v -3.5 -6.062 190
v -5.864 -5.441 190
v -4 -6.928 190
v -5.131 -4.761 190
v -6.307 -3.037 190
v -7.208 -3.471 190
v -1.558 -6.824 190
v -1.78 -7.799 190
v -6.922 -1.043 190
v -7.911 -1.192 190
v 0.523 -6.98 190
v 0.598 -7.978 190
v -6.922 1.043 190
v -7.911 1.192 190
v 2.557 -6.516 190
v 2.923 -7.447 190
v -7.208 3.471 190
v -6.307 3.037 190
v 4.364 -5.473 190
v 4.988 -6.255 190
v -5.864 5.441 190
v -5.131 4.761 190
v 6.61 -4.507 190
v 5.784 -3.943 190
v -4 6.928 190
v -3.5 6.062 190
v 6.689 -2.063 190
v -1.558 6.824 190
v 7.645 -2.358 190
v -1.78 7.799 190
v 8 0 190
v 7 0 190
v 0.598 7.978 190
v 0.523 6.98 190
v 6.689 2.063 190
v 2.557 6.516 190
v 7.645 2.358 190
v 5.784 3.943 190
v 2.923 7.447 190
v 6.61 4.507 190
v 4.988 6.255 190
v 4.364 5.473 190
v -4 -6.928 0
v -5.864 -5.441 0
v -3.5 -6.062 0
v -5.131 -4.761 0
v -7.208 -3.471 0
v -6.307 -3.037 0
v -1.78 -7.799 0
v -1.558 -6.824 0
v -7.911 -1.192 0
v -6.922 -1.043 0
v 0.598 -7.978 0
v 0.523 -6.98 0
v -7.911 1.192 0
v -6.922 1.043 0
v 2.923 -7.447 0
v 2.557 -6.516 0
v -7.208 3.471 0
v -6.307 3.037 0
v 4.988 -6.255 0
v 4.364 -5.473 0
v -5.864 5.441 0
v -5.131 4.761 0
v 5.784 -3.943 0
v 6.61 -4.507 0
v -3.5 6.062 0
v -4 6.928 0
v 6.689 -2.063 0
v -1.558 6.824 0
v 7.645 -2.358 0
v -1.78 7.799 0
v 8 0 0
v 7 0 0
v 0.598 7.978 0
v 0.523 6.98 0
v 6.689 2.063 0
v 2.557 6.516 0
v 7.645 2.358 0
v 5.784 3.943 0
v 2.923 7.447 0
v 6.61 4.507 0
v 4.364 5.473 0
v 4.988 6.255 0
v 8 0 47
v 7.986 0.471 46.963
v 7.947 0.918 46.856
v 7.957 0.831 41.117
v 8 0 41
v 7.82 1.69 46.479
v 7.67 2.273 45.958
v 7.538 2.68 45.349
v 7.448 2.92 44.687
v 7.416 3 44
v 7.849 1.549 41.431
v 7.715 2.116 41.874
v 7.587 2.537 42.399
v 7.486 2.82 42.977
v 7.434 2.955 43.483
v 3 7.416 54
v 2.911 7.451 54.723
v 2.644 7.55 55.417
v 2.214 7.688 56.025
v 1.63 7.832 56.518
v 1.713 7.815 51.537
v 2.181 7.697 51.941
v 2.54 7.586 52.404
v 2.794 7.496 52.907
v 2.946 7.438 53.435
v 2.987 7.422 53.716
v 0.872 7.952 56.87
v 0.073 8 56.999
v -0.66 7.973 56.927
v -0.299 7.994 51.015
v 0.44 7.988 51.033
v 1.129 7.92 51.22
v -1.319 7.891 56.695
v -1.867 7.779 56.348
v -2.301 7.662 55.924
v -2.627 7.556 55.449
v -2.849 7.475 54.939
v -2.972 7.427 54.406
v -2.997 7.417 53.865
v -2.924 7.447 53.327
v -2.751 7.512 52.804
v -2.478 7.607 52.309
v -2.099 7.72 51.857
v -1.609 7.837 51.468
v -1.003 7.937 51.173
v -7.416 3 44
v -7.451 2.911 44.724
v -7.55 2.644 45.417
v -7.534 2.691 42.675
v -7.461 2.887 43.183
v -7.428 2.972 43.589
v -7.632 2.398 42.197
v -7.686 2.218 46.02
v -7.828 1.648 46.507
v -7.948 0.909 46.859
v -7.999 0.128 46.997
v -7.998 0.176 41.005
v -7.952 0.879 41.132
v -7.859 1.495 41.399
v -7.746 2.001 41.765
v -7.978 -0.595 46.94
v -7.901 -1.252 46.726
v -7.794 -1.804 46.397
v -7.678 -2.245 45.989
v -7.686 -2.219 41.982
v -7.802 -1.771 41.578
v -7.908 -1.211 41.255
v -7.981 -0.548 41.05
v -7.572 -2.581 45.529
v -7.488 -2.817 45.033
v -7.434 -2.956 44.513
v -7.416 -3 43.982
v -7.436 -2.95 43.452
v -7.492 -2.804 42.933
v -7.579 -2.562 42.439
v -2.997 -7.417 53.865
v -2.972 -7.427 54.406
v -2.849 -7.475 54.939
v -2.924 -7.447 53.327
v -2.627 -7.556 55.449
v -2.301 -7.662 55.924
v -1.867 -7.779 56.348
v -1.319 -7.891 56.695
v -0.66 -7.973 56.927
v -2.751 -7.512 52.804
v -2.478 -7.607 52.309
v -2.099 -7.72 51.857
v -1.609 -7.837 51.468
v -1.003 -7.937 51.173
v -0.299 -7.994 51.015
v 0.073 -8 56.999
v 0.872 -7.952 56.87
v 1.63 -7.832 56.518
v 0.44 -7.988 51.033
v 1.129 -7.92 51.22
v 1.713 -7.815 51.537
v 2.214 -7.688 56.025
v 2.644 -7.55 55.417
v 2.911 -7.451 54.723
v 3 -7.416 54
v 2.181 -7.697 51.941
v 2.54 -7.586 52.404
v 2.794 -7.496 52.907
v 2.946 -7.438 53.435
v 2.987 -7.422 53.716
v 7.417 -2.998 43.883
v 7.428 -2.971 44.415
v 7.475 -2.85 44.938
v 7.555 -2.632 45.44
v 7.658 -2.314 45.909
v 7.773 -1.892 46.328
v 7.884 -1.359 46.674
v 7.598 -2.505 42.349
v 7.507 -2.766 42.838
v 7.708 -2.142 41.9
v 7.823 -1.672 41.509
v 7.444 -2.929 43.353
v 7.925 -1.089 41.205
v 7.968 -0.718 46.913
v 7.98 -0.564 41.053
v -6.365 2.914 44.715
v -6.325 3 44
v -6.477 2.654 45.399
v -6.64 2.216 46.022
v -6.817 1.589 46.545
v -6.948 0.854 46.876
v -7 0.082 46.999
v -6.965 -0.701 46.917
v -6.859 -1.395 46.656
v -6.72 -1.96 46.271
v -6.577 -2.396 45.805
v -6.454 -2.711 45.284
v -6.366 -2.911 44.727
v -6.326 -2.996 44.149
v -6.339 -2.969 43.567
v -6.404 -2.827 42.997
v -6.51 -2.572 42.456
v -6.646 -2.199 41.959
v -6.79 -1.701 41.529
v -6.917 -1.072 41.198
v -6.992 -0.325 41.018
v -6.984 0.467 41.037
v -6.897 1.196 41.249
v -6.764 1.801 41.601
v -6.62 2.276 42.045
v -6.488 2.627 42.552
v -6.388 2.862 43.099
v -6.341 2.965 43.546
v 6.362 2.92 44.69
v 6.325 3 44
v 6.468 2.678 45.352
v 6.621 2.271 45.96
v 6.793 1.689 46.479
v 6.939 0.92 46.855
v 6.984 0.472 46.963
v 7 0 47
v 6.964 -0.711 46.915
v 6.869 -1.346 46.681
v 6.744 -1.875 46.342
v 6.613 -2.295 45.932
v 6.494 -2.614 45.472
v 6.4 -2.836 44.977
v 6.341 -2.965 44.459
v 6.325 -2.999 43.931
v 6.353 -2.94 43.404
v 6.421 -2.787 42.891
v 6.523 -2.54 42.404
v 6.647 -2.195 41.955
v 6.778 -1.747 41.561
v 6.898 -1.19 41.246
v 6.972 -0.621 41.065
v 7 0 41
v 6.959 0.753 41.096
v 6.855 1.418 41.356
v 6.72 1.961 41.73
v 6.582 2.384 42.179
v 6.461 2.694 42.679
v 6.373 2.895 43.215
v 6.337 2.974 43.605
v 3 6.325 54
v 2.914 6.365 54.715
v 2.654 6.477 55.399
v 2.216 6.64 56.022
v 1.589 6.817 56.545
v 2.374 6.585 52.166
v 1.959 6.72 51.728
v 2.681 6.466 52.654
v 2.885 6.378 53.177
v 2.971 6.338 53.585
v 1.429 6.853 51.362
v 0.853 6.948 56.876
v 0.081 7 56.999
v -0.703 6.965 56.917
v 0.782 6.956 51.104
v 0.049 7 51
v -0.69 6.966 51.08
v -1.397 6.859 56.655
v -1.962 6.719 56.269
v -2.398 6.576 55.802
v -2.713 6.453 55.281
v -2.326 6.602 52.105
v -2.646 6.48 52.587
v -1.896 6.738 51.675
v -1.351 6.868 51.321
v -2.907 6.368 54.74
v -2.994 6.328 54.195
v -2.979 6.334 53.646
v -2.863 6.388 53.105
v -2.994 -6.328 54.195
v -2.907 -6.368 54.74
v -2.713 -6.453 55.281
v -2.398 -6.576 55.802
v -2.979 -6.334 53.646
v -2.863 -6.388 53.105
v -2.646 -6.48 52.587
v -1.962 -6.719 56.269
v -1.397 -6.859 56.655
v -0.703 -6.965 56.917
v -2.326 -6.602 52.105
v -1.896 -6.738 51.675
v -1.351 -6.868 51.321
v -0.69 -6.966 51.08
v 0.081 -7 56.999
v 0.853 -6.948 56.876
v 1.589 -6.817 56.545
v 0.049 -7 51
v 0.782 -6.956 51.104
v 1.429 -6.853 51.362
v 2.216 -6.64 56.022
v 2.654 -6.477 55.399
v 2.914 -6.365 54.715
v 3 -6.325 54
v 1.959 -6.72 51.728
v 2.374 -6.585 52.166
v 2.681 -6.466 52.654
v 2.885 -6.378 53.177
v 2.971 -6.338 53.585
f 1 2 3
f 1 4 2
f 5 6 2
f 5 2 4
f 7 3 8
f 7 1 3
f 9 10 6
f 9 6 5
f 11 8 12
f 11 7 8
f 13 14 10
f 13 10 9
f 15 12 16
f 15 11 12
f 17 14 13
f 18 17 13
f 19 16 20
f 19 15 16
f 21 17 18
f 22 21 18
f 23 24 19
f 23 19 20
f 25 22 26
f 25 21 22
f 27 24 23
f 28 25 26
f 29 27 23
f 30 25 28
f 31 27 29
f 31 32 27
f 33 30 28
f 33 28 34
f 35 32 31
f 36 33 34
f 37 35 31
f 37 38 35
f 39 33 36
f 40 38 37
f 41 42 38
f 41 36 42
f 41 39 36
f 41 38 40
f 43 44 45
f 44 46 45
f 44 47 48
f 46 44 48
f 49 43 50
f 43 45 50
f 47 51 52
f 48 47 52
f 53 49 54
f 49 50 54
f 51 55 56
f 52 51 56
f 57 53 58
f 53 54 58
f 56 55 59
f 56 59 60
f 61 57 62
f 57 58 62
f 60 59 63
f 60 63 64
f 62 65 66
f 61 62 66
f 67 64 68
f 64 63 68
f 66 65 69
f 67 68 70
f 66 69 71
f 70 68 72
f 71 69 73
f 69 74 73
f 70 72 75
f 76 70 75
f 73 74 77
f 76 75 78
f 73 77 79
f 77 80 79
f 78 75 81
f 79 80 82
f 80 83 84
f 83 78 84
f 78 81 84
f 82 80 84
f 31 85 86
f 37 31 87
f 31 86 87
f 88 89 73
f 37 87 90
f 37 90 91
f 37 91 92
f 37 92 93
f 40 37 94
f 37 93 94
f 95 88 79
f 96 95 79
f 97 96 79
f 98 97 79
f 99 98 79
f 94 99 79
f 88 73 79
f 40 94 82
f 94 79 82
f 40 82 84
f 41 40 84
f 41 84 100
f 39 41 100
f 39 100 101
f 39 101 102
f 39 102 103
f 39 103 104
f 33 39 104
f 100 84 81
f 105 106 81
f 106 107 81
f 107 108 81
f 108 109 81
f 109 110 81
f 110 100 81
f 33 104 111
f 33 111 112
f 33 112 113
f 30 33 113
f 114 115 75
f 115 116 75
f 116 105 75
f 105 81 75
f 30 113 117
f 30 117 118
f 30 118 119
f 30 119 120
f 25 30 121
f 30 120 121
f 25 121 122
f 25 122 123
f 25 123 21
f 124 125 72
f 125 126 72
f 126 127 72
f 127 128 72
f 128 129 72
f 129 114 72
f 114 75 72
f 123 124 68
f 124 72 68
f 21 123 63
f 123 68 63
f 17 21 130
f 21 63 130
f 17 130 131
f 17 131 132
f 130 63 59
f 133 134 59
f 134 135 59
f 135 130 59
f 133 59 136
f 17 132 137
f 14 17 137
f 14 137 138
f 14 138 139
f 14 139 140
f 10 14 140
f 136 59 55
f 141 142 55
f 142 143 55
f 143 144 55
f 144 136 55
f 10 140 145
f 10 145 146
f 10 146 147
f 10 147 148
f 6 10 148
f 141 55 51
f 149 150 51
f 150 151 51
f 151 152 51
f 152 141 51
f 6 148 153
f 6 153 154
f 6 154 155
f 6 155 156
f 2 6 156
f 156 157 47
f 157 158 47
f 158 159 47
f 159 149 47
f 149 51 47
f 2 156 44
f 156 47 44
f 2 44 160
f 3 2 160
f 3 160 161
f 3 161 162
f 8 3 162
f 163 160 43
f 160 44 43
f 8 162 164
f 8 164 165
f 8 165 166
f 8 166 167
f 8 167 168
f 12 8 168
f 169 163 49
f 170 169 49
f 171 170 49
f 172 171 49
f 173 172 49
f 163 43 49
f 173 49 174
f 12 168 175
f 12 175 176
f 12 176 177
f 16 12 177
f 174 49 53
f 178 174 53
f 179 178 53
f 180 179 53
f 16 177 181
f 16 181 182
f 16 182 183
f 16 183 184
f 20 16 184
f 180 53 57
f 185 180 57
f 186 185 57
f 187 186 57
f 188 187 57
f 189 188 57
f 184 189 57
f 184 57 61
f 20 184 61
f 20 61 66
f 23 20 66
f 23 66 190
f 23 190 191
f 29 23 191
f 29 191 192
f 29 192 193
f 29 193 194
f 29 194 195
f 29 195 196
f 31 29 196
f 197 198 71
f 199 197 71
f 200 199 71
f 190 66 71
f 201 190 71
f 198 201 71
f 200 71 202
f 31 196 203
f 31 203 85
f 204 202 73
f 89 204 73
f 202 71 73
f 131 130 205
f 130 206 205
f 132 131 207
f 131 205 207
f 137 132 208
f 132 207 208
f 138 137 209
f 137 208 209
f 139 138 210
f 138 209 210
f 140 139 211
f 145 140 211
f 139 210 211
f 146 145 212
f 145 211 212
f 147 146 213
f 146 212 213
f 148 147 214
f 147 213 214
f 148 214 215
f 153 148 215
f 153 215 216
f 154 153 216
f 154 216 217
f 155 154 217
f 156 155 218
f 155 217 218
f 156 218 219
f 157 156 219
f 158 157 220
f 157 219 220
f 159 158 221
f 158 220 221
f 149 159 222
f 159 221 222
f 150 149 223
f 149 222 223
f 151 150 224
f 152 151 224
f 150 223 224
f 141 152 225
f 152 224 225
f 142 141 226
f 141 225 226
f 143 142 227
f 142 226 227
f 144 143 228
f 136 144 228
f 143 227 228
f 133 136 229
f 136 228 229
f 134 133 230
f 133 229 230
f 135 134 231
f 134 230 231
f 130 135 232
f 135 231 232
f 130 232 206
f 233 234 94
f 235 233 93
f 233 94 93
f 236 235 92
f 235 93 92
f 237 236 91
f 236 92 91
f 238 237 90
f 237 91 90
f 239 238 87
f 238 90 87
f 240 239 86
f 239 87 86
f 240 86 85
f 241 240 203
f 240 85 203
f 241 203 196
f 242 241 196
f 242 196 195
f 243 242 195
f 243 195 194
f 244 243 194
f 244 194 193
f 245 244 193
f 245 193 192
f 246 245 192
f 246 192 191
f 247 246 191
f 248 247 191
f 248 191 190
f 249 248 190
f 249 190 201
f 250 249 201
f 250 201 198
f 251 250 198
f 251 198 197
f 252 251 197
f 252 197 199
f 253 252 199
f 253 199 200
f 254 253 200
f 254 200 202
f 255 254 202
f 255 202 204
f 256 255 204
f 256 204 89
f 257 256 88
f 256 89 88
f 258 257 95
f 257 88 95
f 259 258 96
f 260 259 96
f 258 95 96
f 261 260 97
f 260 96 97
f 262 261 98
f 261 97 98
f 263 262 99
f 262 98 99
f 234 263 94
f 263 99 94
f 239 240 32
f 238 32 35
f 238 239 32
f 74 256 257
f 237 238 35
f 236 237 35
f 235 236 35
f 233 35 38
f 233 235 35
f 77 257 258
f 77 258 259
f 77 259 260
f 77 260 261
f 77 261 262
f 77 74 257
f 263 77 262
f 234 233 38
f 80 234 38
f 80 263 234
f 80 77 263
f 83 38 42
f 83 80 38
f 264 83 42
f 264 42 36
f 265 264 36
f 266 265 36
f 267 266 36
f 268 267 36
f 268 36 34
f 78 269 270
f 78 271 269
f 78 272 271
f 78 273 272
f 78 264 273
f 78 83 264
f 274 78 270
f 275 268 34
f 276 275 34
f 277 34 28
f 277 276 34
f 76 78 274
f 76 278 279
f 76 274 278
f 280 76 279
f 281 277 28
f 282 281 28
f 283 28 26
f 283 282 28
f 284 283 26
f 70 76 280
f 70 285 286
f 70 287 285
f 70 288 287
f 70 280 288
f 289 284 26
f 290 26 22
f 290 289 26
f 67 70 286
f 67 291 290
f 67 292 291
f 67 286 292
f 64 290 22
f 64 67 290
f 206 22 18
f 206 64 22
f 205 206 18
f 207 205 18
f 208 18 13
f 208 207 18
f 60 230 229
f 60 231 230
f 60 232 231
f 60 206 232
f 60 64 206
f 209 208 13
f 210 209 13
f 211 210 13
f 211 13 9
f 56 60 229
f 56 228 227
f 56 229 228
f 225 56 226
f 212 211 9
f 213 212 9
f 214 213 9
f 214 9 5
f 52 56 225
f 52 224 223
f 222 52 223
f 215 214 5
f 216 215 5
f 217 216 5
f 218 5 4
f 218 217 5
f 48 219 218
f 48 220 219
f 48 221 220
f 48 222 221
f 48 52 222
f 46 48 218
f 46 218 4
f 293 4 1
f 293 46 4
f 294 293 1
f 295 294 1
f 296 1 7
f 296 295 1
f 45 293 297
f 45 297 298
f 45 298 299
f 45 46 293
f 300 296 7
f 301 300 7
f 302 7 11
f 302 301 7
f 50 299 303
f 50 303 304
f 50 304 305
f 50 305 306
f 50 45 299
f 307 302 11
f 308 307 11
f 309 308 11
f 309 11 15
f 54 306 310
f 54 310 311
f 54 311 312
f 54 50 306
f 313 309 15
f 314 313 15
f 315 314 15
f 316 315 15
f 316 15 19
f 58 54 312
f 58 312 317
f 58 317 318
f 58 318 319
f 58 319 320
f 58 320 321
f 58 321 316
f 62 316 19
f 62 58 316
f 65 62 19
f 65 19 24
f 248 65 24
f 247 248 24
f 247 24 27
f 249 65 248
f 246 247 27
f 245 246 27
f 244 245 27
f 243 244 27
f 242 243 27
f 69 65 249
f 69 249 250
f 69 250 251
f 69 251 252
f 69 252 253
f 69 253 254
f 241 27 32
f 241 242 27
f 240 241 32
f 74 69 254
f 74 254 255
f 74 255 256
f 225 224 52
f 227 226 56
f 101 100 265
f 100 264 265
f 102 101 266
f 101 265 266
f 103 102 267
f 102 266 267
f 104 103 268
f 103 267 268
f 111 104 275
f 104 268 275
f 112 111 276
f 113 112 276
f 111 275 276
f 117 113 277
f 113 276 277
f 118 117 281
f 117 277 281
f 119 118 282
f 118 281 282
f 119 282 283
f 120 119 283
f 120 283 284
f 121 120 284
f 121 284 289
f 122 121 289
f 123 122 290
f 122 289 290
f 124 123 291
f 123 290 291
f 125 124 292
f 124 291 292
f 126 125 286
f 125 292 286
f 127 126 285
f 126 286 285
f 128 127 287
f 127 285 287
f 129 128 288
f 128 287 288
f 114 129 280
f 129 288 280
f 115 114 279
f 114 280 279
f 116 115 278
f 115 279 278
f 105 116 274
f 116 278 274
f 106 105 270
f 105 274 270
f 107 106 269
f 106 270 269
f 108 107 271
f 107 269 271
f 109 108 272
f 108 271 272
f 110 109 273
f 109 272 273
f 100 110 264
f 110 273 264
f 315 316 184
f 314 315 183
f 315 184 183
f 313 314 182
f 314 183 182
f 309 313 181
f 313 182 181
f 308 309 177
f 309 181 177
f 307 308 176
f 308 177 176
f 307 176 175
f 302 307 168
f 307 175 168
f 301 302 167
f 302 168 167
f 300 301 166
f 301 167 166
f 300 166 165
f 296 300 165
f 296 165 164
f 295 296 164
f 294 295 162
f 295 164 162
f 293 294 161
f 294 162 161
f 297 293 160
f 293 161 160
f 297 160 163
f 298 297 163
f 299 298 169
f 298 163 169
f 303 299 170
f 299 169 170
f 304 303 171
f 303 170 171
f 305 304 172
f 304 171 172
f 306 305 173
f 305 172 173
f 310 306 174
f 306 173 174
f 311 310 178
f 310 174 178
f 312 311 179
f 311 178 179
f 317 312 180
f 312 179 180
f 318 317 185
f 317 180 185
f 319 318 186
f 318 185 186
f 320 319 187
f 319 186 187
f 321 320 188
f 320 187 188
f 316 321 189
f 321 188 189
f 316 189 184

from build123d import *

# Parameters (mm, degrees)
F0_R     = 8
F0_R_2   = 7
F1_DEPTH = 190
F2_R     = 3
F3_DEPTH = 20
F4_R     = 3
F5_DEPTH = 12.5


with BuildPart() as f1:
    # F0 (on Top) → F1 (new body)
    with BuildSketch(Plane.XY):
        Circle(F0_R)
        Circle(F0_R_2, mode=Mode.SUBTRACT)
    extrude(amount=F1_DEPTH)

    # F2 (on Right) → F3 (cut, symmetric)
    with BuildSketch(Plane.YZ):
        with Locations((0, 44)):
            Circle(F2_R)
    extrude(amount=F3_DEPTH, both=True, mode=Mode.SUBTRACT)

    # F4 (on Front) → F5 (cut, symmetric)
    with BuildSketch(Plane.XZ):
        with Locations((0, 54)):
            Circle(F4_R)
    extrude(amount=F5_DEPTH, both=True, mode=Mode.SUBTRACT)


solid = f1.part
